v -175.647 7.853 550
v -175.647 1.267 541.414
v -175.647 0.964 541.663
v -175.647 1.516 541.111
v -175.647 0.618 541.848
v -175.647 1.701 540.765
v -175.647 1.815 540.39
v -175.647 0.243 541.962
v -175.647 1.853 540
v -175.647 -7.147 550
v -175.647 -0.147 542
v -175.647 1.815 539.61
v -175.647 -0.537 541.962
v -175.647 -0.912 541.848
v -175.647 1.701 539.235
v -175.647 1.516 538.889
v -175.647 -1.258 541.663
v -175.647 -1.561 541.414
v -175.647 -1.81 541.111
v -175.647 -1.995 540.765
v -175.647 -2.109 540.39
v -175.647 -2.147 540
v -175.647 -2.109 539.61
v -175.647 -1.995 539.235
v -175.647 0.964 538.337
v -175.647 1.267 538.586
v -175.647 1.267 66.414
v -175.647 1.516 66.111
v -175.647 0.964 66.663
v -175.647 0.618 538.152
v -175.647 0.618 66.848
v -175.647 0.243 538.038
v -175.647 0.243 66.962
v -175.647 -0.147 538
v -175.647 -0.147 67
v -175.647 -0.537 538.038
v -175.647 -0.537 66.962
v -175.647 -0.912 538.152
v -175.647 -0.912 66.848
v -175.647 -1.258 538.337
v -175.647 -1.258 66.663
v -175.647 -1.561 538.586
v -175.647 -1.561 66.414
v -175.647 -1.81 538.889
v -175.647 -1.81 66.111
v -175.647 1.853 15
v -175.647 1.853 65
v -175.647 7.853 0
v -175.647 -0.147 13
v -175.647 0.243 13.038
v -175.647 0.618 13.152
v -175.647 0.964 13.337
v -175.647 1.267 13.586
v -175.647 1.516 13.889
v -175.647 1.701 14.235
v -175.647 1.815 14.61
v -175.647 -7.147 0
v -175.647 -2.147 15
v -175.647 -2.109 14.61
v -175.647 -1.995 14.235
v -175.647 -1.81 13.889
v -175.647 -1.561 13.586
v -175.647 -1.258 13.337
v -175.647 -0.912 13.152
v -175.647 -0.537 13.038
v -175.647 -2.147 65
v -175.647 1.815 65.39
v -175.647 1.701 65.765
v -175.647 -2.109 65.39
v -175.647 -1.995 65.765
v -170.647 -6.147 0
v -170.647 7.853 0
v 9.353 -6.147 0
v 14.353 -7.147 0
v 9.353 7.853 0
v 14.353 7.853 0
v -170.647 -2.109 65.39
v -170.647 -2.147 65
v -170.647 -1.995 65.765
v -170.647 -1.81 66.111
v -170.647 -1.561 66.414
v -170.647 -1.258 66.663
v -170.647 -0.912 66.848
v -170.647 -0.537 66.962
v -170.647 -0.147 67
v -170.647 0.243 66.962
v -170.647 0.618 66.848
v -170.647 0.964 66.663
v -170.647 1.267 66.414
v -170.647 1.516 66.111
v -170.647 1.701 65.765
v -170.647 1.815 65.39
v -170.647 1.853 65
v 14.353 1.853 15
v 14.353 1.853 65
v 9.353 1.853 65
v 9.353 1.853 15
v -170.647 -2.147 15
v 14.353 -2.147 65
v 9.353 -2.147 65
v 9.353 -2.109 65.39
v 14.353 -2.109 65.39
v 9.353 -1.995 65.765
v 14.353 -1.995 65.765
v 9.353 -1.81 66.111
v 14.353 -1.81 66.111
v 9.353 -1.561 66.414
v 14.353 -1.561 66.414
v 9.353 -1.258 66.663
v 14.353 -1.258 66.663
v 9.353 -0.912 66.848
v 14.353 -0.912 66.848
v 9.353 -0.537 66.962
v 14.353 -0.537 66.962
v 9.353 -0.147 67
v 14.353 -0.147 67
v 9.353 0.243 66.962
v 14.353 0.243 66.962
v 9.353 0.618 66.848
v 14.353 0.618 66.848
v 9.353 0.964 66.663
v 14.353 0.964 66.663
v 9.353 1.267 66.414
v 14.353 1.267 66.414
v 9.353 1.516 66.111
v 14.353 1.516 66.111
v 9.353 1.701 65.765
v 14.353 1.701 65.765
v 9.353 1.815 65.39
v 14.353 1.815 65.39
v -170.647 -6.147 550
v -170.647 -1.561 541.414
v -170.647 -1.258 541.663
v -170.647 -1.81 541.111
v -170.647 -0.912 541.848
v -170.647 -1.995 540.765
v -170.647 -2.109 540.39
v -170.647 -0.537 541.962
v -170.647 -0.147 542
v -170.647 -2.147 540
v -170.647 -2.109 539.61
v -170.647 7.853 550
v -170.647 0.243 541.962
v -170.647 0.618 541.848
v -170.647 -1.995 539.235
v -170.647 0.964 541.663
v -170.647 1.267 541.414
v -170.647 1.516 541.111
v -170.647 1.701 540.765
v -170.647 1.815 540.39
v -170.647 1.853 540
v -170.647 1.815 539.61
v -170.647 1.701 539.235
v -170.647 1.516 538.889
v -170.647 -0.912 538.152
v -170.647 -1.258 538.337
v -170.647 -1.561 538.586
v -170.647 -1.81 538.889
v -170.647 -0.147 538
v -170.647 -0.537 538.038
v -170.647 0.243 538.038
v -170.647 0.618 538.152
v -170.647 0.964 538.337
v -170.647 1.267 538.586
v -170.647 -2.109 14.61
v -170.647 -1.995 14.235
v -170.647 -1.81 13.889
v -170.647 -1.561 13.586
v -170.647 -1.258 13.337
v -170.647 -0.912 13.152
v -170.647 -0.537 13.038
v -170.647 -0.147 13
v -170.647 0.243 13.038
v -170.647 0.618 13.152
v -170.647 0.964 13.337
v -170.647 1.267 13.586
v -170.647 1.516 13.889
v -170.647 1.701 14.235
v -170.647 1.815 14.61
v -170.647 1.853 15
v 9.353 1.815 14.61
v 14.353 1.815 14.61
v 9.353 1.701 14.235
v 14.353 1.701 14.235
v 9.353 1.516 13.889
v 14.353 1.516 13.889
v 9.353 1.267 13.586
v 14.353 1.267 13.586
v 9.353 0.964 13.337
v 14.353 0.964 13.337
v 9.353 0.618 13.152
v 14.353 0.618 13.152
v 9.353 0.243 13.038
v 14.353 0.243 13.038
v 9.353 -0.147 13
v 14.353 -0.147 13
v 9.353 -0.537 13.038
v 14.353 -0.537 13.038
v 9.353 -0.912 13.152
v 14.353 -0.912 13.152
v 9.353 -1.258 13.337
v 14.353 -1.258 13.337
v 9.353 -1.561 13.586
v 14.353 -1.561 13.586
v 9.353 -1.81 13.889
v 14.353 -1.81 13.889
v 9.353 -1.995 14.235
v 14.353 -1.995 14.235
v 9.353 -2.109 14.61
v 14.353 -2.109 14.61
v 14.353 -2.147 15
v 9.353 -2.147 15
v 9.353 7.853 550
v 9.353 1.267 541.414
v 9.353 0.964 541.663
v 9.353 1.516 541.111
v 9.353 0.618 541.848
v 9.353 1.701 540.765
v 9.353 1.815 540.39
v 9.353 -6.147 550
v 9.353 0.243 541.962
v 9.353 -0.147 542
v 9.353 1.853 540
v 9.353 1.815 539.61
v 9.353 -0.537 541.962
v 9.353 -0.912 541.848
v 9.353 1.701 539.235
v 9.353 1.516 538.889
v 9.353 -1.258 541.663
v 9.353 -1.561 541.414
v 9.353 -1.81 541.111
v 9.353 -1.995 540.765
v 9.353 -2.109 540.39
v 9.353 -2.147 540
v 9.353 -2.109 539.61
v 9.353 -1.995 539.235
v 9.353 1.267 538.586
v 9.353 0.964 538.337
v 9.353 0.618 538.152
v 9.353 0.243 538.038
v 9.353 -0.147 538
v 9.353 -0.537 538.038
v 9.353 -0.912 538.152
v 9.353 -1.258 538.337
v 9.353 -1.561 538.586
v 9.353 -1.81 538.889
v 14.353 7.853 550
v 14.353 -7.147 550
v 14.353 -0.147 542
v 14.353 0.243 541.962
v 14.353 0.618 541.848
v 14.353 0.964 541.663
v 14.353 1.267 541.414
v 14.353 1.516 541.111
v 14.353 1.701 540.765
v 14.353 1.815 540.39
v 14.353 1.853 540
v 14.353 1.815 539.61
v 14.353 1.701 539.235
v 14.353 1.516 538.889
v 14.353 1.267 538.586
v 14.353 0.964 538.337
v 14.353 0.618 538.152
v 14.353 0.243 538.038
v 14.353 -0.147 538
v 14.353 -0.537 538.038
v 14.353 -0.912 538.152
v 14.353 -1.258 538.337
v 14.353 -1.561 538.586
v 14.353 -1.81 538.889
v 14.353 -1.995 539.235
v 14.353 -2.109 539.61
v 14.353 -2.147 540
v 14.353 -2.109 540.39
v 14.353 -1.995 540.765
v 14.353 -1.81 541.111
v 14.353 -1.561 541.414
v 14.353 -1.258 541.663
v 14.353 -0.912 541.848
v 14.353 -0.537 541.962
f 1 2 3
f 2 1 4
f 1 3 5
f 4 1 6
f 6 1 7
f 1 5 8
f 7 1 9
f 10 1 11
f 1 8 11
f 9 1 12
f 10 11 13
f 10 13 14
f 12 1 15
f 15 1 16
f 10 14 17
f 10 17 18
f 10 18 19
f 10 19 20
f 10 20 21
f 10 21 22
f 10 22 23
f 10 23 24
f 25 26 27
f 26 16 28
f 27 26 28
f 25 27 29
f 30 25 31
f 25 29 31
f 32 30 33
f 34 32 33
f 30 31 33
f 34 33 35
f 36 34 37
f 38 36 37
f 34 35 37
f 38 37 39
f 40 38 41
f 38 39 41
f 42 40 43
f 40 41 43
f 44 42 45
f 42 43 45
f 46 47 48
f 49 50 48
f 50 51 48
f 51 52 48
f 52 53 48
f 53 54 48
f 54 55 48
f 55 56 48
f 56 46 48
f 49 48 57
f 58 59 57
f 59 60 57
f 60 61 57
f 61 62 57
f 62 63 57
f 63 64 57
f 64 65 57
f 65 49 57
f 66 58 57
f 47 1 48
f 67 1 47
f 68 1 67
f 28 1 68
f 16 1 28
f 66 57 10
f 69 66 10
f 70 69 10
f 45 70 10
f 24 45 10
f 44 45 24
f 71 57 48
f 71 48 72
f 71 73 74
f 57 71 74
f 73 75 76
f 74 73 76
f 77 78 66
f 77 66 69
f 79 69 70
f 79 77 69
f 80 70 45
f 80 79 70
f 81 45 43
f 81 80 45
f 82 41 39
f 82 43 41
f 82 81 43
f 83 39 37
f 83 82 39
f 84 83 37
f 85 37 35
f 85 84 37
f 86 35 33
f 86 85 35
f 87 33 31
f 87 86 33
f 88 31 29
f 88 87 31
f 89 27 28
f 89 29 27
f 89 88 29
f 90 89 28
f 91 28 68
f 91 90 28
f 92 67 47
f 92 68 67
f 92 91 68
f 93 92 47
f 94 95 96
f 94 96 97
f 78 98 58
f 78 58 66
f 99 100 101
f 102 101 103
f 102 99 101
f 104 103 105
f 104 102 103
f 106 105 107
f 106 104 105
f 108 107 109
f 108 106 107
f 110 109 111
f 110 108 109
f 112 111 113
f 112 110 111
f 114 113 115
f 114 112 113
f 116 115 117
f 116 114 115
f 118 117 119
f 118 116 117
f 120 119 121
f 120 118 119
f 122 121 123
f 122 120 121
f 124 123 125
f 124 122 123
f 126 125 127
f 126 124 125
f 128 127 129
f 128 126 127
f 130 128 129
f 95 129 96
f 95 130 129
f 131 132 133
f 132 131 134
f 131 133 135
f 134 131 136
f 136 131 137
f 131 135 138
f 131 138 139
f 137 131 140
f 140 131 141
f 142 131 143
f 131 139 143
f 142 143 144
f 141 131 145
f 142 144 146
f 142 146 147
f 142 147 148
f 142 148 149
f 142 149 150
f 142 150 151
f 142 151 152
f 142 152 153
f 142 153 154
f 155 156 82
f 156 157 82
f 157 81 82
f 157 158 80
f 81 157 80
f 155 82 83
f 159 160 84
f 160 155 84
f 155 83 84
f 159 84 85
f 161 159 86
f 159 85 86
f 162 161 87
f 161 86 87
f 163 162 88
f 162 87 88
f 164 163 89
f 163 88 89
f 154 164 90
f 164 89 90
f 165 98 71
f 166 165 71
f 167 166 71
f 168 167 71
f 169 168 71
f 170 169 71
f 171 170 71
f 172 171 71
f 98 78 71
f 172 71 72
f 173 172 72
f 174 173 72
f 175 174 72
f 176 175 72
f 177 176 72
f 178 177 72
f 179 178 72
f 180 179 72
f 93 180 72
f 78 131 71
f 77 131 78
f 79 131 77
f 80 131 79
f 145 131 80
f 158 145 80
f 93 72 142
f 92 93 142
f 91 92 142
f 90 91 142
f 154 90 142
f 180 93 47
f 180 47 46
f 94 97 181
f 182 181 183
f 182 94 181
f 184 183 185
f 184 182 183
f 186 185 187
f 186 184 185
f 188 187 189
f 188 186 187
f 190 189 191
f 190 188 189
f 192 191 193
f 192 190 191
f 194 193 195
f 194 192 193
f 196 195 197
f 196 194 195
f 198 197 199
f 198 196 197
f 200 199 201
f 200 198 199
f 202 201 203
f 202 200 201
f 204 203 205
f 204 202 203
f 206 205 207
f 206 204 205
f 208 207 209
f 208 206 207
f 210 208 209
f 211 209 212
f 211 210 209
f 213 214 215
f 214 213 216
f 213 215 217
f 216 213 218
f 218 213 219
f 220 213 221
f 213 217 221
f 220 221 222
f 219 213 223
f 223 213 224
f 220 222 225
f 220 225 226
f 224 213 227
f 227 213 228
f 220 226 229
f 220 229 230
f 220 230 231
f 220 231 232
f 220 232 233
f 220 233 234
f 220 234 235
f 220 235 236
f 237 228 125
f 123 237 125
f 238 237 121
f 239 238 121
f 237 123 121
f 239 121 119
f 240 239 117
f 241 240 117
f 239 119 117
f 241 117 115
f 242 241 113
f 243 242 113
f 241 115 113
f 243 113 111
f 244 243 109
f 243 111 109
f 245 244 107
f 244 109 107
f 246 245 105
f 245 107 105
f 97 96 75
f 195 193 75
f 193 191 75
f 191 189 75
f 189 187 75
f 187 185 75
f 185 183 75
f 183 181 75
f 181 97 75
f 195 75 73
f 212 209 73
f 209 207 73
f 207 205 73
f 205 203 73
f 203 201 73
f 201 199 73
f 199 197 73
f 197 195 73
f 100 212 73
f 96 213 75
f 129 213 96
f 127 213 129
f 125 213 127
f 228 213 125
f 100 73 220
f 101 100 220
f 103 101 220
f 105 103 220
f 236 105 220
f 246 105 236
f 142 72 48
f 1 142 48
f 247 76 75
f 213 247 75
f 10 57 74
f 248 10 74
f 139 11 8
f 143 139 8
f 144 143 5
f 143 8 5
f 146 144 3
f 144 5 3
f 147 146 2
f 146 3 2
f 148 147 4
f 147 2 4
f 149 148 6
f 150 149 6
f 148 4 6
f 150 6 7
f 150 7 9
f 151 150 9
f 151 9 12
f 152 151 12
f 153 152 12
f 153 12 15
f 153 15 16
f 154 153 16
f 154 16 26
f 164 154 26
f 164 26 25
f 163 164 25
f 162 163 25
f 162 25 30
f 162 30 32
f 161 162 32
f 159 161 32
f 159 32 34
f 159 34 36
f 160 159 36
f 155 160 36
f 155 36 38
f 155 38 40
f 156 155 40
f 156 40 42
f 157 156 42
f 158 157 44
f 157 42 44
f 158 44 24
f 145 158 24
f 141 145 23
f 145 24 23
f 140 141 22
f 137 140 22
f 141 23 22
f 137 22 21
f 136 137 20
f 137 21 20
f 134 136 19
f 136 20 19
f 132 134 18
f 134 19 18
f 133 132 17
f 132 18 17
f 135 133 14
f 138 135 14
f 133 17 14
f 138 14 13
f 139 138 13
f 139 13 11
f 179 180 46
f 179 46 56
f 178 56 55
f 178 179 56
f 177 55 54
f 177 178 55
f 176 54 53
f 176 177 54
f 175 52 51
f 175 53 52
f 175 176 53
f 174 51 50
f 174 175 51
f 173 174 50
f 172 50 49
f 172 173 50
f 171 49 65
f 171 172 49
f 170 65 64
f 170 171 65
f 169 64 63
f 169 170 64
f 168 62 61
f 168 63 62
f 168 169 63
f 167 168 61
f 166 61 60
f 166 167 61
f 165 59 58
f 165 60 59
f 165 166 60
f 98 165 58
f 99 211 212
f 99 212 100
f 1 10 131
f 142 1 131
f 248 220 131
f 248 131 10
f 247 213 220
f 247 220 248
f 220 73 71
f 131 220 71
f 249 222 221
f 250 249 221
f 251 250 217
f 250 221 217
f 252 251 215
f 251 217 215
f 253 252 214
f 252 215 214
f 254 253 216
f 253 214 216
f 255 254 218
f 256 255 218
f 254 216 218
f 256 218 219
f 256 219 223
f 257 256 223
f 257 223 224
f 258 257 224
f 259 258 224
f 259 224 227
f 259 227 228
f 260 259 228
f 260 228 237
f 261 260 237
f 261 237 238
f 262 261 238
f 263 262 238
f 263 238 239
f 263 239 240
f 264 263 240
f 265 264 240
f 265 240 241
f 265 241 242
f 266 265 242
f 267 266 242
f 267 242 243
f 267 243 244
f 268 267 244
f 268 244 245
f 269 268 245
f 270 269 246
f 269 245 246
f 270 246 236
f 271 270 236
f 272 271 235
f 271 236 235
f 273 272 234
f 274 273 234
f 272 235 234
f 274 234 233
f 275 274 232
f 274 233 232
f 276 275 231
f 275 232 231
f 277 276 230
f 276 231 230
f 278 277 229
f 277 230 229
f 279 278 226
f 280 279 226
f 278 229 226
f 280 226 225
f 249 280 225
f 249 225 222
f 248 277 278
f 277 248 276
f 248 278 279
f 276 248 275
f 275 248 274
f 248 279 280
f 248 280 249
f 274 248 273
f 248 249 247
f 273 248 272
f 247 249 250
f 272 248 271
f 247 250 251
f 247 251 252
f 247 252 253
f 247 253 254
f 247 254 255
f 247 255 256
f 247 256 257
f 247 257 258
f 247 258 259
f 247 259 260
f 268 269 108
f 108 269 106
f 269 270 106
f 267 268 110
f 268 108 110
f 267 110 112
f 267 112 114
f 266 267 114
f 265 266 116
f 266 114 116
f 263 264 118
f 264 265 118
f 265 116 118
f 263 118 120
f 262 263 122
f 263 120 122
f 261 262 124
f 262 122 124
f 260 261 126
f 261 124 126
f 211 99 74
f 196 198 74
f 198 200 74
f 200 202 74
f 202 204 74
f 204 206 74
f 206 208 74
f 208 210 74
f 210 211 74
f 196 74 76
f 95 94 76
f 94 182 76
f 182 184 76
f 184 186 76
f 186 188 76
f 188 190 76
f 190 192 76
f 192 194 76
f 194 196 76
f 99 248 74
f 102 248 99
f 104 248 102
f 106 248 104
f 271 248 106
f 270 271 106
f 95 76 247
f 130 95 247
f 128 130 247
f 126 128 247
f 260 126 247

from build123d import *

# Parameters (mm, degrees)
BOSS_EXTRUDE1_DEPTH   = 550
F_4_0MM_DOWEL_HOLE1_D = 4
CUT_EXTRUDE1_DEPTH    = 582.946448297


with BuildPart() as part:
    # Sketch1 → Boss-Extrude1 (new body)
    with BuildSketch(Plane.XY):
        Polygon((-175.647058824, 7.852941176), (-175.647058824, -7.147058824), (14.352941176, -7.147058824), (14.352941176, 7.852941176), (9.352941176, 7.852941176), (9.352941176, -6.147058824), (-170.647058824, -6.147058824), (-170.647058824, 7.852941176), align=None)
    extrude(amount=BOSS_EXTRUDE1_DEPTH)

    # Ø4.0mm Dowel Hole1 (through all)
    with Locations(Plane(origin=(14.352941176, 0, 0), x_dir=(0, 0, -1), z_dir=(1, 0, 0))):
        with Locations((-540, -0.147058824)):
            Hole(F_4_0MM_DOWEL_HOLE1_D / 2)

    # Sketch5 → Cut-Extrude1 (cut, through all)
    with BuildSketch(Plane(origin=(14.352941176, 0, 0), x_dir=(0, 0, -1), z_dir=(1, 0, 0))):
        with BuildLine():
            Line((-65, 1.852941176), (-15, 1.852941176))
            ThreePointArc((-15, 1.852941176), (-13, -0.147058824), (-15, -2.147058824))
            Line((-15, -2.147058824), (-65, -2.147058824))
            ThreePointArc((-65, -2.147058824), (-67, -0.147058824), (-65, 1.852941176))
        make_face()
    extrude(amount=-CUT_EXTRUDE1_DEPTH, mode=Mode.SUBTRACT)


solid = part.part
